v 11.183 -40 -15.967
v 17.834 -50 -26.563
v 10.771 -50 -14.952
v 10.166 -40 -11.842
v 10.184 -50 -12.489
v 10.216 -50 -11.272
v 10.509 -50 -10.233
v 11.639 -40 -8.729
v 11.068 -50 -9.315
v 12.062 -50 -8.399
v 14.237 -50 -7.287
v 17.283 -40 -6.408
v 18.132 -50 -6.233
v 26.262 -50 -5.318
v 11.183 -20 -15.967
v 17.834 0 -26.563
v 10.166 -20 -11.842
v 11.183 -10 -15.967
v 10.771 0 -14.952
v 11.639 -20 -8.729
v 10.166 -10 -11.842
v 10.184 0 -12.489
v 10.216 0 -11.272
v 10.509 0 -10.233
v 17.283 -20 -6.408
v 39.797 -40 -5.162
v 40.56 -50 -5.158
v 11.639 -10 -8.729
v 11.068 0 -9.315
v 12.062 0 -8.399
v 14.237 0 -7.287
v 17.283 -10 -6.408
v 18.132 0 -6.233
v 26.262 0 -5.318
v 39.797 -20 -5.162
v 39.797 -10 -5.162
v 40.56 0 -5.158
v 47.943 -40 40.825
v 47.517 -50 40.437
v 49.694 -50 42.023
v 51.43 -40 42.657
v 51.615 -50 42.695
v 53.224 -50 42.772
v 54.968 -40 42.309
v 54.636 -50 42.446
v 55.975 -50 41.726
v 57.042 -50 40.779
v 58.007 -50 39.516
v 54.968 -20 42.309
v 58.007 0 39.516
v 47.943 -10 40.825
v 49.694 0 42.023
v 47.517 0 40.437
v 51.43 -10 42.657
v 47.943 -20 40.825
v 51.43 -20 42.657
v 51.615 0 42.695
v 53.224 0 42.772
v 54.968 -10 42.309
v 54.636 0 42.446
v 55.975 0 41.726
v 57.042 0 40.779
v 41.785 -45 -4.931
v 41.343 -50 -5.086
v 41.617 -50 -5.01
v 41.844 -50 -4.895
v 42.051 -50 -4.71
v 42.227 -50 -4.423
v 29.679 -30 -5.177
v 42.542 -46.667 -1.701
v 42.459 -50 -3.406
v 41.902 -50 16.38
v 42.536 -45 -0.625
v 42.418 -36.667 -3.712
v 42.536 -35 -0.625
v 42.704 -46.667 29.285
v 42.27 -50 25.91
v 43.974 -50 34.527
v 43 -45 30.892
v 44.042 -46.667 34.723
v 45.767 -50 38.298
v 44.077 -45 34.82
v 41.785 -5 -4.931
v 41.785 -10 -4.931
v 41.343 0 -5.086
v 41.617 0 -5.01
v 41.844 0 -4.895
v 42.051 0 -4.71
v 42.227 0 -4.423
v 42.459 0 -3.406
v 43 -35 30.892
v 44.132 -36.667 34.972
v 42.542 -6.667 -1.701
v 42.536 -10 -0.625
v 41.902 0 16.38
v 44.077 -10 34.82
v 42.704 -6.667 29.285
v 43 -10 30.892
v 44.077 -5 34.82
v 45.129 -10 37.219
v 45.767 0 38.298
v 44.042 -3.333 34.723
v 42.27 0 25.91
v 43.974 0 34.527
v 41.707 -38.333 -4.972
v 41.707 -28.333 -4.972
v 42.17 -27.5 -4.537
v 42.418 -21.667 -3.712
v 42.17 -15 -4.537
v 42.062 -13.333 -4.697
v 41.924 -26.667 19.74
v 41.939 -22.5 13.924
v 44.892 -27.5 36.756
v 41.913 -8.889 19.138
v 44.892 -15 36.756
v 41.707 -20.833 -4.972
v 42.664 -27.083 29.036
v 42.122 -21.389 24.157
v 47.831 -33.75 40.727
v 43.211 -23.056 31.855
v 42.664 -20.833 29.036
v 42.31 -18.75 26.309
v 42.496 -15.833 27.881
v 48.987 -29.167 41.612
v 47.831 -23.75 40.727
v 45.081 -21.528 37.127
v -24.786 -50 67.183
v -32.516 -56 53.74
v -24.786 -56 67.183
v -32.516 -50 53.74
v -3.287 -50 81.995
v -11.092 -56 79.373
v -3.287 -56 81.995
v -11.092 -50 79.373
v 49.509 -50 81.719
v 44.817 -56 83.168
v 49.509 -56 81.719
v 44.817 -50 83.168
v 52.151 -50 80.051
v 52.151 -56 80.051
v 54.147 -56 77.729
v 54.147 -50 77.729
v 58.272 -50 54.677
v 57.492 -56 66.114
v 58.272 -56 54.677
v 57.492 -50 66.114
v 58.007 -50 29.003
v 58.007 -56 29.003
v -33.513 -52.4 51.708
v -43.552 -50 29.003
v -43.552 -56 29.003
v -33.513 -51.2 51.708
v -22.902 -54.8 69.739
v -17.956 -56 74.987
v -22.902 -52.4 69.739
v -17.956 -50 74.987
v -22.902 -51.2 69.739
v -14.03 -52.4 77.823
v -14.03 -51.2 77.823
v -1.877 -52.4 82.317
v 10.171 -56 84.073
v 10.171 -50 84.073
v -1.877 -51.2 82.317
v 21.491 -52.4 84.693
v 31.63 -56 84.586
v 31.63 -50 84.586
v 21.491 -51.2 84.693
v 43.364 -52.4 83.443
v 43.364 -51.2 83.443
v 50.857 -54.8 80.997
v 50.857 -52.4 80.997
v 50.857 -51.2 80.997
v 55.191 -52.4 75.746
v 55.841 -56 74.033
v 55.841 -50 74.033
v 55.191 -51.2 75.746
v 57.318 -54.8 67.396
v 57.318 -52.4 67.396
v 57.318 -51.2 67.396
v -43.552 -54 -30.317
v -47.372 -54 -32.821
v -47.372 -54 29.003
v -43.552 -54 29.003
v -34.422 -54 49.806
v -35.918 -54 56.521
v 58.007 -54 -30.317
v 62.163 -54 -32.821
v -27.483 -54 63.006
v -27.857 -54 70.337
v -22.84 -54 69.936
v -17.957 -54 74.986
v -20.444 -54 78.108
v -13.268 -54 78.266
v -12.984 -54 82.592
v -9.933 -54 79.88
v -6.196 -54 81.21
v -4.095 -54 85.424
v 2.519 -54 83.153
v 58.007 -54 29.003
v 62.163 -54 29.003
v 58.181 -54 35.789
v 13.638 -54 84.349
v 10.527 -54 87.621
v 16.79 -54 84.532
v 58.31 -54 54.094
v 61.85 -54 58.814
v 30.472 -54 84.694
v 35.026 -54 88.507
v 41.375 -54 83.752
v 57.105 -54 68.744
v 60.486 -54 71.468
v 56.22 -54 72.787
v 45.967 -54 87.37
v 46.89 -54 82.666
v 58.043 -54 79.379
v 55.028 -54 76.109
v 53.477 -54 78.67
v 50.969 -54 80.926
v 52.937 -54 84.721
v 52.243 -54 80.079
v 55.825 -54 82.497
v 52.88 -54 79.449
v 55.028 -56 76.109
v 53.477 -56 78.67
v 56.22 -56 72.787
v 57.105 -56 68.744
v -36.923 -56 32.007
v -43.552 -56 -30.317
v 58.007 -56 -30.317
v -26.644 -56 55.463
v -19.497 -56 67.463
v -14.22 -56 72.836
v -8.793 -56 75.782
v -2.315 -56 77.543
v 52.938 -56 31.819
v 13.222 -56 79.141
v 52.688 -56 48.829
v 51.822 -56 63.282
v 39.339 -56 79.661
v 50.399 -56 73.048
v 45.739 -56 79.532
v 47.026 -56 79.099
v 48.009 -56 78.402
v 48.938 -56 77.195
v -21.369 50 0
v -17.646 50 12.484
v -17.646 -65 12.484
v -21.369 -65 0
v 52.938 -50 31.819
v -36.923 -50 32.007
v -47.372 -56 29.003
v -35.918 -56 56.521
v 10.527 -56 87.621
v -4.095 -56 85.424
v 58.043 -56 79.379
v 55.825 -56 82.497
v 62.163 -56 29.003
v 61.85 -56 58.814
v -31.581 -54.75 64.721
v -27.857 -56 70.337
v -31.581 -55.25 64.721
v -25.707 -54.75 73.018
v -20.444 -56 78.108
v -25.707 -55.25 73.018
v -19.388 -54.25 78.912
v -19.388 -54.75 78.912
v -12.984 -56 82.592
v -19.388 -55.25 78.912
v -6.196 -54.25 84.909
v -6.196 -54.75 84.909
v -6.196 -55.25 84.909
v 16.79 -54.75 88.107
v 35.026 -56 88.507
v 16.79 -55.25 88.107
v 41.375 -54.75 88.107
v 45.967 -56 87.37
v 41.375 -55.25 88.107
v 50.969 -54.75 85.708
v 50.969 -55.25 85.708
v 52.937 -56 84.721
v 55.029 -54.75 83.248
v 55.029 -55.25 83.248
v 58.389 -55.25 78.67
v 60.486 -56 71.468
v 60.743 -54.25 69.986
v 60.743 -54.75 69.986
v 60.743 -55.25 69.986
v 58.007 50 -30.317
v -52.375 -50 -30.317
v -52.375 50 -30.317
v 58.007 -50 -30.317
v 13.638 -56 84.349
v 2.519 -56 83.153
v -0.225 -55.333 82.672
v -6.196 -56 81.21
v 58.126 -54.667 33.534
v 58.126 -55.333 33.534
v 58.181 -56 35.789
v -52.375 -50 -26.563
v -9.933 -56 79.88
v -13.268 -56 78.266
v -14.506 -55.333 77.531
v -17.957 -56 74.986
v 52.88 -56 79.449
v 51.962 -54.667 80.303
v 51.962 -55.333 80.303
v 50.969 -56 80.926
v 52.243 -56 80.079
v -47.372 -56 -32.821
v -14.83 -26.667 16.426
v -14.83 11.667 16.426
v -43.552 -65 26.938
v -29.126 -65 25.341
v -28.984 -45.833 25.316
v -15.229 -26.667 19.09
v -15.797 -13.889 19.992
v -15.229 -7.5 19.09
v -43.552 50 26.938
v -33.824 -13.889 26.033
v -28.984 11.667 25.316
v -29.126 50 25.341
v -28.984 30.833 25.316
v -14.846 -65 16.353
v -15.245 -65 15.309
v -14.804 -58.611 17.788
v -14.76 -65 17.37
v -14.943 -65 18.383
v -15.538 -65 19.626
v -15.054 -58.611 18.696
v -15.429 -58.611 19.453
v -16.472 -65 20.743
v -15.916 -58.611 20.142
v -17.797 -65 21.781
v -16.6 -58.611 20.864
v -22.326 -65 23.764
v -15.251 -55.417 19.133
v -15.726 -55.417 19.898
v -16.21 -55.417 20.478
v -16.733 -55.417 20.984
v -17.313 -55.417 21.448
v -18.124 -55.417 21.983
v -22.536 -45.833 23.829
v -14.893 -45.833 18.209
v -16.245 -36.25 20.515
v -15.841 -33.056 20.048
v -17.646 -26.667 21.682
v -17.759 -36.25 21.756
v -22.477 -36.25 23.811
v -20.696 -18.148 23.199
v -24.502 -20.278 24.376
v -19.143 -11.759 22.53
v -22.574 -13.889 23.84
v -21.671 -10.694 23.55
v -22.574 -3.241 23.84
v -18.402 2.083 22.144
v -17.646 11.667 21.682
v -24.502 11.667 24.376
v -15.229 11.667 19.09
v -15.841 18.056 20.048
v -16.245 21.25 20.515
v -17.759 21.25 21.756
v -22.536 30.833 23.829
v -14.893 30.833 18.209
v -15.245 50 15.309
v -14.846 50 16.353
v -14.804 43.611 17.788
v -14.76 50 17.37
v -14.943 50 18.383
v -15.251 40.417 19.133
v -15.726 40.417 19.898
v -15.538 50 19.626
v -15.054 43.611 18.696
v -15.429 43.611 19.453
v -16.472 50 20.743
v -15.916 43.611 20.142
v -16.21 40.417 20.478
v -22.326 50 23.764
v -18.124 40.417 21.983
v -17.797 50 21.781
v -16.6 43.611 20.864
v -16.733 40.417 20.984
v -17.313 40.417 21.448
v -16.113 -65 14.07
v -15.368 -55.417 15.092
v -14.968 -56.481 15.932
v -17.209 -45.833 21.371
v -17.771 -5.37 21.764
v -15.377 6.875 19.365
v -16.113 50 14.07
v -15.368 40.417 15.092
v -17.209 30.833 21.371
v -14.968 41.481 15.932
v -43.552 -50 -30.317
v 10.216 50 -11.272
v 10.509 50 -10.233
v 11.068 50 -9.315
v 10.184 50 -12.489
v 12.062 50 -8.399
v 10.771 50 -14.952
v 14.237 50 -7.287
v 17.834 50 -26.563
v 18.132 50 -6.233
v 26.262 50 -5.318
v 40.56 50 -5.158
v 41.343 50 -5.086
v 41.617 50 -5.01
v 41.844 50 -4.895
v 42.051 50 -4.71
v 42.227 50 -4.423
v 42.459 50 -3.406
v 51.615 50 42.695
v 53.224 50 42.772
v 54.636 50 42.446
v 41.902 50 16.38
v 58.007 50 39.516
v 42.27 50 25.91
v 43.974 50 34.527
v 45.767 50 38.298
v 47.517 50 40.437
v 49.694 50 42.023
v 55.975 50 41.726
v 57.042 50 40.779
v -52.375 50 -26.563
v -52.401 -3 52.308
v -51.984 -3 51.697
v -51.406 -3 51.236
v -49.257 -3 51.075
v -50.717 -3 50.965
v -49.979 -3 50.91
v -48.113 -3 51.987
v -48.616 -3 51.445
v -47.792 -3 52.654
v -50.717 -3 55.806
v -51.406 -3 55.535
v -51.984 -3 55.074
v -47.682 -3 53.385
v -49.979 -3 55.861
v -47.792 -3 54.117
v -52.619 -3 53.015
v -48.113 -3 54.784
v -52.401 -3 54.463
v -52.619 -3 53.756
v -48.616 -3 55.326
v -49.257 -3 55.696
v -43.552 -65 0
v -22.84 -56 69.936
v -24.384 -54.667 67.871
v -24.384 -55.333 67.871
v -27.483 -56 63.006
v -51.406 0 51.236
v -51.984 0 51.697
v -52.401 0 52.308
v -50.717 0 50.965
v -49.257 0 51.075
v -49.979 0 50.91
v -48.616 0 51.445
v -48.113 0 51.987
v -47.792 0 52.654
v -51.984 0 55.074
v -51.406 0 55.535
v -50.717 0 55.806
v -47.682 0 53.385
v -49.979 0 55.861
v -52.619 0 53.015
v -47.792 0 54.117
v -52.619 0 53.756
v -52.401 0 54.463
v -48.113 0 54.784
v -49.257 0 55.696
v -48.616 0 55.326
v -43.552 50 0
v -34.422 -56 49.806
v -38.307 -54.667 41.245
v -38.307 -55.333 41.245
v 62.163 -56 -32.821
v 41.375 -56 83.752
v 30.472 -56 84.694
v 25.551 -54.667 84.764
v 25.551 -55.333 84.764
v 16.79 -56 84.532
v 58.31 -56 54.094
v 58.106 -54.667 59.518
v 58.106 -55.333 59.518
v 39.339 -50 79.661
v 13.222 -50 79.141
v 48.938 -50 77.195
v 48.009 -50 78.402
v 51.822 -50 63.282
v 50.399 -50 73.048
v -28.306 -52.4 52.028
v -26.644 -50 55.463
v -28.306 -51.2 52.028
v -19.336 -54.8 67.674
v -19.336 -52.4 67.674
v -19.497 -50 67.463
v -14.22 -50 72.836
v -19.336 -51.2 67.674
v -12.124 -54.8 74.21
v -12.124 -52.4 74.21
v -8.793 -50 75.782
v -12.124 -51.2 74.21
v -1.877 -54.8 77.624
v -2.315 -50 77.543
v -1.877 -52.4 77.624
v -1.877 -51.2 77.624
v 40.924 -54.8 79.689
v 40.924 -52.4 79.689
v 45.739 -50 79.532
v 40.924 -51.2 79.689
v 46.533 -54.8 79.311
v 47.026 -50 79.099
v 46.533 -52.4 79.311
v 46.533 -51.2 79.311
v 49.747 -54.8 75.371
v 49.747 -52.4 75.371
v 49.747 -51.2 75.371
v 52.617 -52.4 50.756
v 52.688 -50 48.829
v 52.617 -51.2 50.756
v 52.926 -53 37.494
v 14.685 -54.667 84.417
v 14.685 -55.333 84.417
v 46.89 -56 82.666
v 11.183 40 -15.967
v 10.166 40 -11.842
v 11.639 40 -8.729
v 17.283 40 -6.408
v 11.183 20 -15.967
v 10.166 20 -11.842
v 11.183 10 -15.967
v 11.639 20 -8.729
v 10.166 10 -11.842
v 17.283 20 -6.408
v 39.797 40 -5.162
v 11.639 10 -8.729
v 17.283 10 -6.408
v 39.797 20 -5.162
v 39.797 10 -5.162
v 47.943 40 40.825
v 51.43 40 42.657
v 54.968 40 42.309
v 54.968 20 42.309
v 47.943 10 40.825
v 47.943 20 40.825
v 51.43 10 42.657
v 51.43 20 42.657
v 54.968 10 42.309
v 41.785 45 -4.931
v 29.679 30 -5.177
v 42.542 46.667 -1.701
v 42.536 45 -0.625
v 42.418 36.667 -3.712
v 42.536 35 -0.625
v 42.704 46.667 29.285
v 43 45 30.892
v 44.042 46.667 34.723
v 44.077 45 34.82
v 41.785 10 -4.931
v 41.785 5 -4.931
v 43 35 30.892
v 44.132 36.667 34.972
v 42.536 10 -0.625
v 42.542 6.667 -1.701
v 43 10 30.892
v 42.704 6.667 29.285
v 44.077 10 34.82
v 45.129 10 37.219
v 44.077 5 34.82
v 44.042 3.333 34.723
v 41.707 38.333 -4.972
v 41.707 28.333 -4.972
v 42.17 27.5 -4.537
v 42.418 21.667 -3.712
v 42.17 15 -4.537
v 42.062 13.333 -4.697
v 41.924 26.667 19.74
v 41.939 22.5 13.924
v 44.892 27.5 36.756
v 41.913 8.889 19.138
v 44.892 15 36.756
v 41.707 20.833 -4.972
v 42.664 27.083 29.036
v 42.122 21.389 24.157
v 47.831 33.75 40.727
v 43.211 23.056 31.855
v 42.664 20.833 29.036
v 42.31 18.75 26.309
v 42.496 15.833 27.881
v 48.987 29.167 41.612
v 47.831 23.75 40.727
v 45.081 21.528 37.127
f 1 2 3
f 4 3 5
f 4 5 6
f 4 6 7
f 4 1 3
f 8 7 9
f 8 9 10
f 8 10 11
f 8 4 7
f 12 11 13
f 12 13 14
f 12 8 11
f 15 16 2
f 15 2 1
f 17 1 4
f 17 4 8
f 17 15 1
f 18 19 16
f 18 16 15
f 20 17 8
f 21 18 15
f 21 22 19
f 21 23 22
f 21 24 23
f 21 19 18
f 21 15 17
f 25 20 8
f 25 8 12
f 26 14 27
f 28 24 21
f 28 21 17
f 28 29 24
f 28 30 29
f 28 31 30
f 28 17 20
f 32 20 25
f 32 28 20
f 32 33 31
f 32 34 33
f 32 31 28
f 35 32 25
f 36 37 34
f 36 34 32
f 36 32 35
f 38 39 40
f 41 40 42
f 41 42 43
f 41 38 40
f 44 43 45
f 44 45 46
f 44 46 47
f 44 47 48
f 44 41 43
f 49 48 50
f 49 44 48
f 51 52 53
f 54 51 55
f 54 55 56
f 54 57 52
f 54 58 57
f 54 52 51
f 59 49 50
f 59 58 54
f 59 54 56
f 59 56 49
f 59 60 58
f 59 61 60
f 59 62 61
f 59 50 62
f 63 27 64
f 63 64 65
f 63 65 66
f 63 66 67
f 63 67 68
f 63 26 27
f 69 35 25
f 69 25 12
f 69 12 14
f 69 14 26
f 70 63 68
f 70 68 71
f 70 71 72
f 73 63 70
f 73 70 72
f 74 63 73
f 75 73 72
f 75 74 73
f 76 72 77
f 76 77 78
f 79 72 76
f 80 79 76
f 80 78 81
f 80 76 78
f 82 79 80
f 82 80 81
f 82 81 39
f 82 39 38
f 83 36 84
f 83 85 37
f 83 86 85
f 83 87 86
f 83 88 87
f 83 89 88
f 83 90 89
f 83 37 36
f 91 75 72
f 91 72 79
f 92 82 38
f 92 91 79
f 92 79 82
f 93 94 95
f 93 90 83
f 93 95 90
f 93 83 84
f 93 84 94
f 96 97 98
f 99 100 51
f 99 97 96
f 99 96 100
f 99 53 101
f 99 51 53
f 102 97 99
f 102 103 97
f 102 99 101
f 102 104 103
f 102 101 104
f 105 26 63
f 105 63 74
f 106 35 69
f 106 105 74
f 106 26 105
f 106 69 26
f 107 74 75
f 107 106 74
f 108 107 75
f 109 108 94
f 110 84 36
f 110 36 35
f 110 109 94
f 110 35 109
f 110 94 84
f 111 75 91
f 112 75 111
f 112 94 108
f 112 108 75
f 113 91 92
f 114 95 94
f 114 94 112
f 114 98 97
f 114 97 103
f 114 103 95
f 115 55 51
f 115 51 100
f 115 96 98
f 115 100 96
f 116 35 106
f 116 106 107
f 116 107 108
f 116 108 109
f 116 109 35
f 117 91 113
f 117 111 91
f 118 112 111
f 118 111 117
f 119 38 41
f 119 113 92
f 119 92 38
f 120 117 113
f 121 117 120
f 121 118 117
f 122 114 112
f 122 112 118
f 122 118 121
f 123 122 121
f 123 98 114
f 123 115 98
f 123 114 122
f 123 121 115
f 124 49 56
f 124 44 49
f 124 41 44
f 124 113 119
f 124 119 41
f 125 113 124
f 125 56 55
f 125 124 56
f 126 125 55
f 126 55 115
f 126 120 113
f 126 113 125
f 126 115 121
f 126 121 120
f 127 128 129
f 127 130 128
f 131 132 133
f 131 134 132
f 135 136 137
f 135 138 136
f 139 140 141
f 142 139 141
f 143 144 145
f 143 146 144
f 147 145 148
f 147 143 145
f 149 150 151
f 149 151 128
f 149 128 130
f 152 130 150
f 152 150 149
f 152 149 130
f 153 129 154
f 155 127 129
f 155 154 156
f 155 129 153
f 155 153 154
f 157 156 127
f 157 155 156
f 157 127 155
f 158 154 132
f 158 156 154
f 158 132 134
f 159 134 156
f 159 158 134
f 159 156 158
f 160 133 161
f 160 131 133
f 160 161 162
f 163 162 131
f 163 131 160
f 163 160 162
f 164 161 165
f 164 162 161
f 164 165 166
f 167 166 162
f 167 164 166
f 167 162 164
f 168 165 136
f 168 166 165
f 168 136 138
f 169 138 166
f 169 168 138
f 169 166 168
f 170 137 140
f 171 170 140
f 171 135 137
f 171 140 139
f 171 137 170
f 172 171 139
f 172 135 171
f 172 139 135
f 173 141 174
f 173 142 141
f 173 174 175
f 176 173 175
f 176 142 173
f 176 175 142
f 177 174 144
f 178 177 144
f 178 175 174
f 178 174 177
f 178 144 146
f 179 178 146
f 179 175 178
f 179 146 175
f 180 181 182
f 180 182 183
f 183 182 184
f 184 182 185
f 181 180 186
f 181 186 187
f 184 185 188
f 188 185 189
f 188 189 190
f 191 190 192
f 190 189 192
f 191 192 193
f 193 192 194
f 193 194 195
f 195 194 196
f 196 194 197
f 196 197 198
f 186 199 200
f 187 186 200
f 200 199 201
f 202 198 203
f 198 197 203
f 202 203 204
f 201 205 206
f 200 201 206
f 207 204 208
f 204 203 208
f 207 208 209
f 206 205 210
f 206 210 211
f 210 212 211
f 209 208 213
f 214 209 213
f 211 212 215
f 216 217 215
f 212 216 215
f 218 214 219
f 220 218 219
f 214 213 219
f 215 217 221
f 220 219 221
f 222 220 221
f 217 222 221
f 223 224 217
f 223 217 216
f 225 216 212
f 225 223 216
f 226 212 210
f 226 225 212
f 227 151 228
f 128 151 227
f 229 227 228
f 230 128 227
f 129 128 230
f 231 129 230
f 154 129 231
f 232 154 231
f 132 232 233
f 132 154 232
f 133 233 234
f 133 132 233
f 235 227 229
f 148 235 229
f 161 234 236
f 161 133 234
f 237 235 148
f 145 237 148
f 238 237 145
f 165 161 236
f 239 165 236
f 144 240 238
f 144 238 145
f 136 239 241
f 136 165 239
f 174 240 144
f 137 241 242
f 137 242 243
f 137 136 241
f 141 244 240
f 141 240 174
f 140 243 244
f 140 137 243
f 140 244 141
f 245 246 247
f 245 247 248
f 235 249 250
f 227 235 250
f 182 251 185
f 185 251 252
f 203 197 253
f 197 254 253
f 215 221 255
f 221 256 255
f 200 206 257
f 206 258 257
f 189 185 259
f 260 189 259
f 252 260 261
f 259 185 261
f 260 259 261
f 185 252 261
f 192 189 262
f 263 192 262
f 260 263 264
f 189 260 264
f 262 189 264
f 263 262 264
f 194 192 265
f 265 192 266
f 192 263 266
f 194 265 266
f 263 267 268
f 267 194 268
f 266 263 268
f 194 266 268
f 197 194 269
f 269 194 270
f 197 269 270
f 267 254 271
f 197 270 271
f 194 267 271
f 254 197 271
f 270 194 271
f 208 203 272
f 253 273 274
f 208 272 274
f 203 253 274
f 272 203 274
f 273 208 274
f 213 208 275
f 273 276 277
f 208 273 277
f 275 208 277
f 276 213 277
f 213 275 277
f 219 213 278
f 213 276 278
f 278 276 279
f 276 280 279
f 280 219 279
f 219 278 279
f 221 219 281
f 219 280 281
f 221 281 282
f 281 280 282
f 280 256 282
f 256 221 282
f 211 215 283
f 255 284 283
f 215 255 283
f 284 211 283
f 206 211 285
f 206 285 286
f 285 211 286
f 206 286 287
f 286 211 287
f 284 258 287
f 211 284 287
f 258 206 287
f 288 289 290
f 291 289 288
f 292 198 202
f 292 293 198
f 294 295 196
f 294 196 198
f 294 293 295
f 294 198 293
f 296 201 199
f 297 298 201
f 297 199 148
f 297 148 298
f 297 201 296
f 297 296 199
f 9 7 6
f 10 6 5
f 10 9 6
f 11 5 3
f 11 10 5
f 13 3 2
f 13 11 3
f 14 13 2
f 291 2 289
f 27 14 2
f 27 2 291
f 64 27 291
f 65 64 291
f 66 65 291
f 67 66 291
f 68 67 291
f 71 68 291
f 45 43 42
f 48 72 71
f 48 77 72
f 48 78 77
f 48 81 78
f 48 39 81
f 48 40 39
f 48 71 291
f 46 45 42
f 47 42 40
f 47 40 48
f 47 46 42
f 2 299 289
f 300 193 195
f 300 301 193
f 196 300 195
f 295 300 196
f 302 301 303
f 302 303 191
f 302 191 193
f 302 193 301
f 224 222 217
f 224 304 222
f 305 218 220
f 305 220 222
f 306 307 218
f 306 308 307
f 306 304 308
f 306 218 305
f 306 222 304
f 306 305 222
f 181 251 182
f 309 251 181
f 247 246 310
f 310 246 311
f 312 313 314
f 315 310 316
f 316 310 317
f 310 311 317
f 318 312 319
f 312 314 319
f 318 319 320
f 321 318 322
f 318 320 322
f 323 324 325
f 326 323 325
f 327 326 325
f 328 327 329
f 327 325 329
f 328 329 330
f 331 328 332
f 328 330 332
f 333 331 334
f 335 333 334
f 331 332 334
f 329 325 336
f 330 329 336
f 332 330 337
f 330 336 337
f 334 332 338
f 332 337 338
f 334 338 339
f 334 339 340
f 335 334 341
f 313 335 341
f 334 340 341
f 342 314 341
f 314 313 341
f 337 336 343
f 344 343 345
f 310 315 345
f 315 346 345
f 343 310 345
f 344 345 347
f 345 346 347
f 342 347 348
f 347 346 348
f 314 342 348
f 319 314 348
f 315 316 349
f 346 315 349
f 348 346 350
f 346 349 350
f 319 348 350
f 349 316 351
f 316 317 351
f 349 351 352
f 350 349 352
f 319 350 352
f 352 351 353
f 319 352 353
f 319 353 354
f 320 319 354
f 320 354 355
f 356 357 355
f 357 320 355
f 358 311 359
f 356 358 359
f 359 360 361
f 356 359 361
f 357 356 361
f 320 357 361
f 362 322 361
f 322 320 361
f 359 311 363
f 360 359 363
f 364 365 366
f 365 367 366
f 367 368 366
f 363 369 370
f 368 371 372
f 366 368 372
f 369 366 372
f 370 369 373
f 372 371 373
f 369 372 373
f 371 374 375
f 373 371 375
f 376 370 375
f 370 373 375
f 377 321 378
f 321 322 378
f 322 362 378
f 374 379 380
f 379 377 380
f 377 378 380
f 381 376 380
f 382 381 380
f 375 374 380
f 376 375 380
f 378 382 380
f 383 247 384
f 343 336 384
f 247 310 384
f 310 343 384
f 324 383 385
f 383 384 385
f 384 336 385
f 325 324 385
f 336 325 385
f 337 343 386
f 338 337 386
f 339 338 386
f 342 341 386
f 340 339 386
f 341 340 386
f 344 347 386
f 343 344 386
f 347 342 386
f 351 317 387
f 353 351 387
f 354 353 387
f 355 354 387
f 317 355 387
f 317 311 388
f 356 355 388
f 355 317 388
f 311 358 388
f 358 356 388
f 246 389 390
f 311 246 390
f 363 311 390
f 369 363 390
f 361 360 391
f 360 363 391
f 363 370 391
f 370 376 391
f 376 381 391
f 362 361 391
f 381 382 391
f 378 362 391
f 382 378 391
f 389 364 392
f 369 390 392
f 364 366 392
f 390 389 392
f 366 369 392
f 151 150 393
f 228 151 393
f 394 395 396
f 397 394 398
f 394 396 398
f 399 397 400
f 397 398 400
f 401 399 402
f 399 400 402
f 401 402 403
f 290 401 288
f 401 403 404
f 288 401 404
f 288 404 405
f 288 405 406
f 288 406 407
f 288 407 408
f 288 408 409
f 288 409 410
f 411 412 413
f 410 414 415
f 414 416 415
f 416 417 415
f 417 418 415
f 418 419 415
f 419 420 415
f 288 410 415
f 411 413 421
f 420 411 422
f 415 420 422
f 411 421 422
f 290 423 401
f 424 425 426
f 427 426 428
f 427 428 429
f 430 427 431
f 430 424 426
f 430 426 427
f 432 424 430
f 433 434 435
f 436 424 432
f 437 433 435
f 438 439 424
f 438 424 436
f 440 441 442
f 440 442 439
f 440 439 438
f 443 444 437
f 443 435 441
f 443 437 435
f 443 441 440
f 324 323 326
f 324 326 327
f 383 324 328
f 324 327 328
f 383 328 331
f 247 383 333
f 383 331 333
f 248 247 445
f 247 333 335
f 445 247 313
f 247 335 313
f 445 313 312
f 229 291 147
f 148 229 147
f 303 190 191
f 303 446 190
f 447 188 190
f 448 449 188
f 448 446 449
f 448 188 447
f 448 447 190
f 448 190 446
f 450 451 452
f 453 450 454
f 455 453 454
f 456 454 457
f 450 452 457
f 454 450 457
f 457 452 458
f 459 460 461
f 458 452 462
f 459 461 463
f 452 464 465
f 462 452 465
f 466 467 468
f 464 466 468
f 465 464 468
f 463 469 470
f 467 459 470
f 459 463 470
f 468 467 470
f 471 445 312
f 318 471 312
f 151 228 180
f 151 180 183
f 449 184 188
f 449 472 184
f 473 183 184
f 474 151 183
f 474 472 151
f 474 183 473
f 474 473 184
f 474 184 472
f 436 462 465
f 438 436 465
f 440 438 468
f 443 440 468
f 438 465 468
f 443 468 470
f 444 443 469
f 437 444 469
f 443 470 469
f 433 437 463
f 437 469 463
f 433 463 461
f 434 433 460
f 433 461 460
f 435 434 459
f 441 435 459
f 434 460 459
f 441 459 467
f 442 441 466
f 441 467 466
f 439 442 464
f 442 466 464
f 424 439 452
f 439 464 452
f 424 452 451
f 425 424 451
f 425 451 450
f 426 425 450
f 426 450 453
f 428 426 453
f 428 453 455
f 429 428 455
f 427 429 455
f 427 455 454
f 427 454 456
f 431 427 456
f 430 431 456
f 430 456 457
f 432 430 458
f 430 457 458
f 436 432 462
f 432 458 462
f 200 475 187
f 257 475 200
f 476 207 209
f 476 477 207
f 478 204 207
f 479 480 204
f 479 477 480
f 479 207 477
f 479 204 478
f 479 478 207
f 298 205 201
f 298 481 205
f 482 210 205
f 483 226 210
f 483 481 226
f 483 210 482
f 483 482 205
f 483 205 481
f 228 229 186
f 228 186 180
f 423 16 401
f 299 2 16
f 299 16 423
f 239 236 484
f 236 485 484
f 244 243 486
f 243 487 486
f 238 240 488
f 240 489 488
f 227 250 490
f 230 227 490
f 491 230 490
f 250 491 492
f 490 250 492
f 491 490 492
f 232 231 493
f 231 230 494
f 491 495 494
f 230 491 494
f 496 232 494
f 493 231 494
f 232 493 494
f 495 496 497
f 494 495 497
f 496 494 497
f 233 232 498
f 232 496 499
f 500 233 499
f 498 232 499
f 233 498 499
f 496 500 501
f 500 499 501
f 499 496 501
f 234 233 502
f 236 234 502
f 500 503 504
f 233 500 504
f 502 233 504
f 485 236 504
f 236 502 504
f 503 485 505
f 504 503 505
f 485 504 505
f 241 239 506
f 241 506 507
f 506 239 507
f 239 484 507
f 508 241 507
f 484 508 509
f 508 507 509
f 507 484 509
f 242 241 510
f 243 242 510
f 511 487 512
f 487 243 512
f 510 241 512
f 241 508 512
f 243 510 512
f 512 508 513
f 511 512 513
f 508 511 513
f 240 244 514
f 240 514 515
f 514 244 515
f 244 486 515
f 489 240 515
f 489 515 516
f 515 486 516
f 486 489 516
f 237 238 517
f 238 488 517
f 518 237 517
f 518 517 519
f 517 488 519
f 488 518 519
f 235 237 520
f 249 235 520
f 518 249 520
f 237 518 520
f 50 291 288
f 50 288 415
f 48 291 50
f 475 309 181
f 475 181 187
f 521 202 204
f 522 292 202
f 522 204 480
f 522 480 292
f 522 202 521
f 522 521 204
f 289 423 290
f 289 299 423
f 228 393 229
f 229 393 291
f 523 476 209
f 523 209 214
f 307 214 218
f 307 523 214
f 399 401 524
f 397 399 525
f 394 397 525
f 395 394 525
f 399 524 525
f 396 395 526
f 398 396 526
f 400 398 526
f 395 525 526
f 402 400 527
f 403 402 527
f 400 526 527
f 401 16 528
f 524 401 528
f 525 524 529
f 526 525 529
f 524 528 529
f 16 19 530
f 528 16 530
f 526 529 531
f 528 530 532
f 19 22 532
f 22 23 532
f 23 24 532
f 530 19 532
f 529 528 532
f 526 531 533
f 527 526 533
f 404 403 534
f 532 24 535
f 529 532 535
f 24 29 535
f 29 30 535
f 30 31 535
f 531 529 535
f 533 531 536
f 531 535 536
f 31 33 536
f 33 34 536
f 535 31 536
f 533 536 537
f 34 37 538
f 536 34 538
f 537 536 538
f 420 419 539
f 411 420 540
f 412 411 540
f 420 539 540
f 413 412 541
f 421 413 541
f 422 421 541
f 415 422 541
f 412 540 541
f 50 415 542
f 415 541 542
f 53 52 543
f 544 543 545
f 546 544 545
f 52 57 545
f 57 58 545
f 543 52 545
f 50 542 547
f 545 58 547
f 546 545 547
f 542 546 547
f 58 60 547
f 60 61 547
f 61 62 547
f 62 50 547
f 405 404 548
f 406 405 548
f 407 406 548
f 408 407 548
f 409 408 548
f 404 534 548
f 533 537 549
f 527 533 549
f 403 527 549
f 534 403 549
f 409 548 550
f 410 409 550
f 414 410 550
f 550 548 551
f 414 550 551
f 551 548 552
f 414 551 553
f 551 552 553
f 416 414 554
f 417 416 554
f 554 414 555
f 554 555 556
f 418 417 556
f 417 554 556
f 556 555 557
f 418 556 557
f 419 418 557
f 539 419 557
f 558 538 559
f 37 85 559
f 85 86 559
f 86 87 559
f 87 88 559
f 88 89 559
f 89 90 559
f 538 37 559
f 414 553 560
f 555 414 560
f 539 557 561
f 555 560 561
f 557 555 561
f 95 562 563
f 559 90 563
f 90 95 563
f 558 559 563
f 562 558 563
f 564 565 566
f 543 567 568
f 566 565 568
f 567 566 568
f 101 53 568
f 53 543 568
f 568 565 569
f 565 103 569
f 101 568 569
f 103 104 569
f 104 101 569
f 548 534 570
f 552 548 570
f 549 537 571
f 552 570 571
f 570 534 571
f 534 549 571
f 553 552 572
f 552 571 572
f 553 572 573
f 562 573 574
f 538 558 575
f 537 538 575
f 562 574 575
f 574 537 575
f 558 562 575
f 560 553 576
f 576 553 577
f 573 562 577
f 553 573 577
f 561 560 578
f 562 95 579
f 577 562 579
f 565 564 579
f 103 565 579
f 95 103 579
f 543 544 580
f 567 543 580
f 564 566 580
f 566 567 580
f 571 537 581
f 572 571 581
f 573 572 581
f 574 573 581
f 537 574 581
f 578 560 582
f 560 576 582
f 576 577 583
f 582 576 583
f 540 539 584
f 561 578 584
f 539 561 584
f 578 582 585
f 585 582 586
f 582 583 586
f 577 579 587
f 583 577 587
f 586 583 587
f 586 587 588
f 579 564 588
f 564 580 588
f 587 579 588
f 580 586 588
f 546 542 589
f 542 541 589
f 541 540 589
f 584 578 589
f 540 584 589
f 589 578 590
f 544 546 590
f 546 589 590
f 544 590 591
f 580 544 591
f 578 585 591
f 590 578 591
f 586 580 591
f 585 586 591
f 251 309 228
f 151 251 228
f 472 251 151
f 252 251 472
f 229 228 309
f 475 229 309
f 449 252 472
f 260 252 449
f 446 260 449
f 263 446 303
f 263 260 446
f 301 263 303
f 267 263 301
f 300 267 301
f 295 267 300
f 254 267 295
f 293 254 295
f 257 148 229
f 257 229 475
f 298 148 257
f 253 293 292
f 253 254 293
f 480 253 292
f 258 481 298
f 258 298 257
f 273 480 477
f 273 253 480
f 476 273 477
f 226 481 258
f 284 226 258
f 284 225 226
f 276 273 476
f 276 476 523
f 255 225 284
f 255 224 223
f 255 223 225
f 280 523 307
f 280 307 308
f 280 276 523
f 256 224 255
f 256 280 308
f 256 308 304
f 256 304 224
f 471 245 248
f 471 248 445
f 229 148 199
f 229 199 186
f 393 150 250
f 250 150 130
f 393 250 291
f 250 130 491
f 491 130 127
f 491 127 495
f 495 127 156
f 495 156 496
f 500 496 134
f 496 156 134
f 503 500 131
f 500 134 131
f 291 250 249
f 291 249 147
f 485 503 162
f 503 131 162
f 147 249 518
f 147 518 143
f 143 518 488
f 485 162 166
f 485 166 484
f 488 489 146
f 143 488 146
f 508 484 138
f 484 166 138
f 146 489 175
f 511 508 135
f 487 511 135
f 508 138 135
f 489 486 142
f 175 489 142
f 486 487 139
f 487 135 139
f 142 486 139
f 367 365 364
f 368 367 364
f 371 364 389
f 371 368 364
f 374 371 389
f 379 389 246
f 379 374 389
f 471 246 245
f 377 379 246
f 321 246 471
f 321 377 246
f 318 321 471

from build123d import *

# Parameters (mm, degrees)
F1_DEPTH = 50
F3_DEPTH = 115
F5_DEPTH = 6
F7_DEPTH = 2
F8_R     = 2.4825689864
F9_DEPTH = 3


with BuildPart() as f1:
    # F0 (on Front) → F1 (new body, symmetric)
    with BuildSketch(Plane.XZ):
        with BuildLine():
            Line((-52.3748546839, -26.5628732741), (-52.3748546839, -30.3173419088))
            Line((-52.3748546839, -30.3173419088), (58.0065622926, -30.3173419088))
            Line((58.0065622926, -30.3173419088), (58.0065622926, 9.8554827273))
            Line((58.0065622926, 9.8554827273), (58.0065622926, 39.5157933235))
            add(Edge.make_bspline(
                [(17.8337320685, -26.5628732741), (12.2987850228, -18.6842330707), (2.0561256493, -4.0935398057), (39.9184715576, -5.3165841483), (44.2737718214, -4.953746865), (37.2323042761, 40.1599145958), (54.5306136351, 44.9857218694), (58.0065622926, 39.5157933235)],
                knots=[0, 0, 0, 0, 0.1616552234, 0.3598685336, 0.4245980156, 0.6623038598, 0.7973775563, 0.7973775563, 0.7973775563, 0.7973775563], degree=3))
            Line((17.8337320685, -26.5628732741), (-52.3748546839, -26.5628732741))
        make_face()
    extrude(amount=F1_DEPTH, both=True)


with BuildPart() as f3:
    # F2 (on face) → F3 (new body)
    with BuildSketch(Plane(origin=(0, 50, 0), x_dir=(-1, 0, 0), z_dir=(0, 1, 0))):
        with BuildLine():
            Line((17.6460072398, 12.4836126342), (21.3691905319, 0))
            Line((21.3691905319, 0), (43.551851064, 0))
            Line((43.551851064, 0), (43.551851064, 26.9383192062))
            add(Edge.make_bspline(
                [(17.6460072398, 12.4836126342), (16.3933606924, 13.7029773667), (13.7509765364, 16.2751554931), (17.0166456197, 24.3596606637), (34.3061298742, 26.3135049454), (43.551851064, 26.9383192062)],
                knots=[0, 0, 0, 0, 0.1536034597, 0.3240174566, 0.6828172606, 0.6828172606, 0.6828172606, 0.6828172606], degree=3))
        make_face()
    extrude(amount=-F3_DEPTH)


with BuildPart() as f5:
    # F4 (on face) → F5 (new body)
    with BuildSketch(Plane.XZ.offset(50)):
        with BuildLine():
            Line((-43.551851064, -30.3173419088), (58.0065622926, -30.3173419088))
            Line((58.0065622926, -30.3173419088), (58.0065622926, 29.003277421))
            add(Edge.make_bspline(
                [(-43.551851064, 29.003277421), (-36.922845047, 44.6592747847), (-25.4385964008, 71.7820992428), (-3.7518062151, 85.038269091), (43.5736062436, 85.5189515045), (59.2989838811, 77.3551079832), (58.5136064736, 47.9727178463), (58.0065622926, 29.003277421)],
                knots=[0, 0, 0, 0, 0.2327586614, 0.4032366747, 0.6349341911, 0.7643114096, 1, 1, 1, 1], degree=3))
            Line((-43.551851064, 29.003277421), (-43.551851064, -30.3173419088))
        make_face()
        with BuildLine():
            Line((52.9380254447, 31.8191312253), (-36.922845047, 32.0068523288))
            add(Edge.make_bspline(
                [(-36.922845047, 32.0068523288), (-31.2175141555, 45.8404922054), (-21.4566188567, 69.5076051224), (-3.5567539168, 80.1005176166), (40.6849079728, 79.3030163856), (53.2273429053, 80.5116568037), (52.9460170699, 34.053291403), (52.9380254447, 31.8191312253)],
                knots=[0, 0, 0, 0, 0.2292277789, 0.3921715308, 0.6301185848, 0.7440435368, 0.9842506716, 0.9842506716, 0.9842506716, 0.9842506716], degree=3))
        make_face(mode=Mode.SUBTRACT)
    extrude(amount=F5_DEPTH)


with BuildPart() as f7:
    # F6 (on face) → F7 (new body)
    with BuildSketch(Plane.XZ.offset(56)):
        with BuildLine():
            Line((-47.3715141416, 29.003277421), (-47.3715141416, -32.8206047416))
            Line((-47.3715141416, -32.8206047416), (62.1626153588, -32.8206047416))
            Line((62.1626153588, -32.8206047416), (62.1626153588, 29.003277421))
            add(Edge.make_bspline(
                [(-47.3715141416, 29.003277421), (-42.2280699361, 42.2198476495), (-33.5244918268, 64.5845213439), (-20.2851907334, 79.6870424527), (-6.0041537363, 85.8583833125), (16.4320092077, 88.5474555911), (40.9895385441, 88.8583689047), (51.0659377242, 86.1678990592), (62.5916202731, 78.9173438118), (62.337496767, 49.3504620957), (62.1626153588, 29.003277421)],
                knots=[0, 0, 0, 0, 0.166389744, 0.2815596078, 0.3829161749, 0.5111842507, 0.6432045249, 0.7269363985, 0.8120844944, 1, 1, 1, 1], degree=3))
        make_face()
        with BuildLine():
            Line((58.0065622926, -30.3173419088), (-43.551851064, -30.3173419088))
            Line((-43.551851064, -30.3173419088), (-43.551851064, 29.003277421))
            add(Edge.make_bspline(
                [(-43.551851064, 29.003277421), (-38.3204591544, 41.3584718099), (-33.0890672449, 53.7136661988), (-27.4828879153, 63.0059549724)],
                knots=[0, 0, 0, 0, 0.1836854236, 0.1836854236, 0.1836854236, 0.1836854236], degree=3))
            add(Edge.make_bspline(
                [(-27.482887925, 63.0059549574), (-24.3302758225, 68.4157326192), (-21.4295958334, 72.0828429709), (-17.957038942, 74.9861221565)],
                knots=[0.1612719831, 0.1612719831, 0.1612719831, 0.1612719831, 0.2641550169, 0.2641550169, 0.2641550169, 0.2641550169], degree=3))
            add(Edge.make_bspline(
                [(-17.9570389343, 74.9861221627), (-14.6749515115, 77.8007594297), (-10.9529267226, 79.769390292), (-6.1962749316, 81.2096741076)],
                knots=[0.2826296593, 0.2826296593, 0.2826296593, 0.2826296593, 0.3765494898, 0.3765494898, 0.3765494898, 0.3765494898], degree=3))
            add(Edge.make_bspline(
                [(-6.1962749169, 81.2096741119), (-0.6572543837, 82.9144230389), (6.291182739, 83.8572821801), (13.6379271177, 84.3489450881)],
                knots=[0.3600816524, 0.3600816524, 0.3600816524, 0.3600816524, 0.4710528722, 0.4710528722, 0.4710528722, 0.4710528722], degree=3))
            add(Edge.make_bspline(
                [(13.6379271245, 84.3489450889), (14.6833159379, 84.4201213225), (15.7354211839, 84.4811104473), (16.7899038052, 84.5320422281)],
                knots=[0.4822944328, 0.4822944328, 0.4822944328, 0.4822944328, 0.497095641, 0.497095641, 0.497095641, 0.497095641], degree=3))
            add(Edge.make_bspline(
                [(16.7899038249, 84.532042229), (25.5336177388, 84.9666119001), (34.6291365122, 84.8388843352), (41.3751229916, 83.7522895568)],
                knots=[0.4868160775, 0.4868160775, 0.4868160775, 0.4868160775, 0.6172415909, 0.6172415909, 0.6172415909, 0.6172415909], degree=3))
            add(Edge.make_bspline(
                [(41.37512301, 83.7522895553), (42.0655087346, 83.6561100972), (46.098220428, 83.0299538744), (49.0483928027, 82.151915481), (50.9693511028, 80.9262823084)],
                knots=[0.6219322123, 0.6219322123, 0.6219322123, 0.6219322123, 0.6349341911, 0.7009002717, 0.7009002717, 0.7009002717, 0.7009002717], degree=3))
            add(Edge.make_bspline(
                [(50.9693510968, 80.9262823136), (52.0995470946, 80.3163335876), (52.7575997639, 79.717319044), (53.4766927149, 78.6703378075)],
                knots=[0.7004093349, 0.7004093349, 0.7004093349, 0.7004093349, 0.748705673, 0.748705673, 0.748705673, 0.748705673], degree=3))
            add(Edge.make_bspline(
                [(53.4766927076, 78.6703378143), (54.1335263791, 77.8434472478), (55.6431087364, 75.2643661502), (56.6393650354, 71.4821342037), (57.105223434, 68.7441786872)],
                knots=[0.7339912193, 0.7339912193, 0.7339912193, 0.7339912193, 0.7643114096, 0.8150763436, 0.8150763436, 0.8150763436, 0.8150763436], degree=3))
            add(Edge.make_bspline(
                [(57.1052234363, 68.7441786706), (58.5760757583, 60.7983080581), (58.4878333308, 48.6087414253), (58.1809962005, 35.7889954003)],
                knots=[0.834197512, 0.834197512, 0.834197512, 0.834197512, 0.9752539568, 0.9752539568, 0.9752539568, 0.9752539568], degree=3))
            add(Edge.make_bspline(
                [(58.1809962004, 35.7889953986), (58.1277911102, 33.5386668791), (58.0671767014, 31.2709721501), (58.0065622926, 29.003277421)],
                knots=[0.9718246948, 0.9718246948, 0.9718246948, 0.9718246948, 1, 1, 1, 1], degree=3))
            Line((58.0065622926, 29.003277421), (58.0065622926, -30.3173419088))
        make_face(mode=Mode.SUBTRACT)
    extrude(amount=-F7_DEPTH)


with BuildPart() as f9:
    # F8 (on Front) → F9 (new body)
    with BuildSketch(Plane.XZ):
        with Locations((-50.1643046737, 53.3854961395)):
            Circle(F8_R)
    extrude(amount=F9_DEPTH)


solid = Compound([f1.part, f3.part, f5.part, f7.part, f9.part])
